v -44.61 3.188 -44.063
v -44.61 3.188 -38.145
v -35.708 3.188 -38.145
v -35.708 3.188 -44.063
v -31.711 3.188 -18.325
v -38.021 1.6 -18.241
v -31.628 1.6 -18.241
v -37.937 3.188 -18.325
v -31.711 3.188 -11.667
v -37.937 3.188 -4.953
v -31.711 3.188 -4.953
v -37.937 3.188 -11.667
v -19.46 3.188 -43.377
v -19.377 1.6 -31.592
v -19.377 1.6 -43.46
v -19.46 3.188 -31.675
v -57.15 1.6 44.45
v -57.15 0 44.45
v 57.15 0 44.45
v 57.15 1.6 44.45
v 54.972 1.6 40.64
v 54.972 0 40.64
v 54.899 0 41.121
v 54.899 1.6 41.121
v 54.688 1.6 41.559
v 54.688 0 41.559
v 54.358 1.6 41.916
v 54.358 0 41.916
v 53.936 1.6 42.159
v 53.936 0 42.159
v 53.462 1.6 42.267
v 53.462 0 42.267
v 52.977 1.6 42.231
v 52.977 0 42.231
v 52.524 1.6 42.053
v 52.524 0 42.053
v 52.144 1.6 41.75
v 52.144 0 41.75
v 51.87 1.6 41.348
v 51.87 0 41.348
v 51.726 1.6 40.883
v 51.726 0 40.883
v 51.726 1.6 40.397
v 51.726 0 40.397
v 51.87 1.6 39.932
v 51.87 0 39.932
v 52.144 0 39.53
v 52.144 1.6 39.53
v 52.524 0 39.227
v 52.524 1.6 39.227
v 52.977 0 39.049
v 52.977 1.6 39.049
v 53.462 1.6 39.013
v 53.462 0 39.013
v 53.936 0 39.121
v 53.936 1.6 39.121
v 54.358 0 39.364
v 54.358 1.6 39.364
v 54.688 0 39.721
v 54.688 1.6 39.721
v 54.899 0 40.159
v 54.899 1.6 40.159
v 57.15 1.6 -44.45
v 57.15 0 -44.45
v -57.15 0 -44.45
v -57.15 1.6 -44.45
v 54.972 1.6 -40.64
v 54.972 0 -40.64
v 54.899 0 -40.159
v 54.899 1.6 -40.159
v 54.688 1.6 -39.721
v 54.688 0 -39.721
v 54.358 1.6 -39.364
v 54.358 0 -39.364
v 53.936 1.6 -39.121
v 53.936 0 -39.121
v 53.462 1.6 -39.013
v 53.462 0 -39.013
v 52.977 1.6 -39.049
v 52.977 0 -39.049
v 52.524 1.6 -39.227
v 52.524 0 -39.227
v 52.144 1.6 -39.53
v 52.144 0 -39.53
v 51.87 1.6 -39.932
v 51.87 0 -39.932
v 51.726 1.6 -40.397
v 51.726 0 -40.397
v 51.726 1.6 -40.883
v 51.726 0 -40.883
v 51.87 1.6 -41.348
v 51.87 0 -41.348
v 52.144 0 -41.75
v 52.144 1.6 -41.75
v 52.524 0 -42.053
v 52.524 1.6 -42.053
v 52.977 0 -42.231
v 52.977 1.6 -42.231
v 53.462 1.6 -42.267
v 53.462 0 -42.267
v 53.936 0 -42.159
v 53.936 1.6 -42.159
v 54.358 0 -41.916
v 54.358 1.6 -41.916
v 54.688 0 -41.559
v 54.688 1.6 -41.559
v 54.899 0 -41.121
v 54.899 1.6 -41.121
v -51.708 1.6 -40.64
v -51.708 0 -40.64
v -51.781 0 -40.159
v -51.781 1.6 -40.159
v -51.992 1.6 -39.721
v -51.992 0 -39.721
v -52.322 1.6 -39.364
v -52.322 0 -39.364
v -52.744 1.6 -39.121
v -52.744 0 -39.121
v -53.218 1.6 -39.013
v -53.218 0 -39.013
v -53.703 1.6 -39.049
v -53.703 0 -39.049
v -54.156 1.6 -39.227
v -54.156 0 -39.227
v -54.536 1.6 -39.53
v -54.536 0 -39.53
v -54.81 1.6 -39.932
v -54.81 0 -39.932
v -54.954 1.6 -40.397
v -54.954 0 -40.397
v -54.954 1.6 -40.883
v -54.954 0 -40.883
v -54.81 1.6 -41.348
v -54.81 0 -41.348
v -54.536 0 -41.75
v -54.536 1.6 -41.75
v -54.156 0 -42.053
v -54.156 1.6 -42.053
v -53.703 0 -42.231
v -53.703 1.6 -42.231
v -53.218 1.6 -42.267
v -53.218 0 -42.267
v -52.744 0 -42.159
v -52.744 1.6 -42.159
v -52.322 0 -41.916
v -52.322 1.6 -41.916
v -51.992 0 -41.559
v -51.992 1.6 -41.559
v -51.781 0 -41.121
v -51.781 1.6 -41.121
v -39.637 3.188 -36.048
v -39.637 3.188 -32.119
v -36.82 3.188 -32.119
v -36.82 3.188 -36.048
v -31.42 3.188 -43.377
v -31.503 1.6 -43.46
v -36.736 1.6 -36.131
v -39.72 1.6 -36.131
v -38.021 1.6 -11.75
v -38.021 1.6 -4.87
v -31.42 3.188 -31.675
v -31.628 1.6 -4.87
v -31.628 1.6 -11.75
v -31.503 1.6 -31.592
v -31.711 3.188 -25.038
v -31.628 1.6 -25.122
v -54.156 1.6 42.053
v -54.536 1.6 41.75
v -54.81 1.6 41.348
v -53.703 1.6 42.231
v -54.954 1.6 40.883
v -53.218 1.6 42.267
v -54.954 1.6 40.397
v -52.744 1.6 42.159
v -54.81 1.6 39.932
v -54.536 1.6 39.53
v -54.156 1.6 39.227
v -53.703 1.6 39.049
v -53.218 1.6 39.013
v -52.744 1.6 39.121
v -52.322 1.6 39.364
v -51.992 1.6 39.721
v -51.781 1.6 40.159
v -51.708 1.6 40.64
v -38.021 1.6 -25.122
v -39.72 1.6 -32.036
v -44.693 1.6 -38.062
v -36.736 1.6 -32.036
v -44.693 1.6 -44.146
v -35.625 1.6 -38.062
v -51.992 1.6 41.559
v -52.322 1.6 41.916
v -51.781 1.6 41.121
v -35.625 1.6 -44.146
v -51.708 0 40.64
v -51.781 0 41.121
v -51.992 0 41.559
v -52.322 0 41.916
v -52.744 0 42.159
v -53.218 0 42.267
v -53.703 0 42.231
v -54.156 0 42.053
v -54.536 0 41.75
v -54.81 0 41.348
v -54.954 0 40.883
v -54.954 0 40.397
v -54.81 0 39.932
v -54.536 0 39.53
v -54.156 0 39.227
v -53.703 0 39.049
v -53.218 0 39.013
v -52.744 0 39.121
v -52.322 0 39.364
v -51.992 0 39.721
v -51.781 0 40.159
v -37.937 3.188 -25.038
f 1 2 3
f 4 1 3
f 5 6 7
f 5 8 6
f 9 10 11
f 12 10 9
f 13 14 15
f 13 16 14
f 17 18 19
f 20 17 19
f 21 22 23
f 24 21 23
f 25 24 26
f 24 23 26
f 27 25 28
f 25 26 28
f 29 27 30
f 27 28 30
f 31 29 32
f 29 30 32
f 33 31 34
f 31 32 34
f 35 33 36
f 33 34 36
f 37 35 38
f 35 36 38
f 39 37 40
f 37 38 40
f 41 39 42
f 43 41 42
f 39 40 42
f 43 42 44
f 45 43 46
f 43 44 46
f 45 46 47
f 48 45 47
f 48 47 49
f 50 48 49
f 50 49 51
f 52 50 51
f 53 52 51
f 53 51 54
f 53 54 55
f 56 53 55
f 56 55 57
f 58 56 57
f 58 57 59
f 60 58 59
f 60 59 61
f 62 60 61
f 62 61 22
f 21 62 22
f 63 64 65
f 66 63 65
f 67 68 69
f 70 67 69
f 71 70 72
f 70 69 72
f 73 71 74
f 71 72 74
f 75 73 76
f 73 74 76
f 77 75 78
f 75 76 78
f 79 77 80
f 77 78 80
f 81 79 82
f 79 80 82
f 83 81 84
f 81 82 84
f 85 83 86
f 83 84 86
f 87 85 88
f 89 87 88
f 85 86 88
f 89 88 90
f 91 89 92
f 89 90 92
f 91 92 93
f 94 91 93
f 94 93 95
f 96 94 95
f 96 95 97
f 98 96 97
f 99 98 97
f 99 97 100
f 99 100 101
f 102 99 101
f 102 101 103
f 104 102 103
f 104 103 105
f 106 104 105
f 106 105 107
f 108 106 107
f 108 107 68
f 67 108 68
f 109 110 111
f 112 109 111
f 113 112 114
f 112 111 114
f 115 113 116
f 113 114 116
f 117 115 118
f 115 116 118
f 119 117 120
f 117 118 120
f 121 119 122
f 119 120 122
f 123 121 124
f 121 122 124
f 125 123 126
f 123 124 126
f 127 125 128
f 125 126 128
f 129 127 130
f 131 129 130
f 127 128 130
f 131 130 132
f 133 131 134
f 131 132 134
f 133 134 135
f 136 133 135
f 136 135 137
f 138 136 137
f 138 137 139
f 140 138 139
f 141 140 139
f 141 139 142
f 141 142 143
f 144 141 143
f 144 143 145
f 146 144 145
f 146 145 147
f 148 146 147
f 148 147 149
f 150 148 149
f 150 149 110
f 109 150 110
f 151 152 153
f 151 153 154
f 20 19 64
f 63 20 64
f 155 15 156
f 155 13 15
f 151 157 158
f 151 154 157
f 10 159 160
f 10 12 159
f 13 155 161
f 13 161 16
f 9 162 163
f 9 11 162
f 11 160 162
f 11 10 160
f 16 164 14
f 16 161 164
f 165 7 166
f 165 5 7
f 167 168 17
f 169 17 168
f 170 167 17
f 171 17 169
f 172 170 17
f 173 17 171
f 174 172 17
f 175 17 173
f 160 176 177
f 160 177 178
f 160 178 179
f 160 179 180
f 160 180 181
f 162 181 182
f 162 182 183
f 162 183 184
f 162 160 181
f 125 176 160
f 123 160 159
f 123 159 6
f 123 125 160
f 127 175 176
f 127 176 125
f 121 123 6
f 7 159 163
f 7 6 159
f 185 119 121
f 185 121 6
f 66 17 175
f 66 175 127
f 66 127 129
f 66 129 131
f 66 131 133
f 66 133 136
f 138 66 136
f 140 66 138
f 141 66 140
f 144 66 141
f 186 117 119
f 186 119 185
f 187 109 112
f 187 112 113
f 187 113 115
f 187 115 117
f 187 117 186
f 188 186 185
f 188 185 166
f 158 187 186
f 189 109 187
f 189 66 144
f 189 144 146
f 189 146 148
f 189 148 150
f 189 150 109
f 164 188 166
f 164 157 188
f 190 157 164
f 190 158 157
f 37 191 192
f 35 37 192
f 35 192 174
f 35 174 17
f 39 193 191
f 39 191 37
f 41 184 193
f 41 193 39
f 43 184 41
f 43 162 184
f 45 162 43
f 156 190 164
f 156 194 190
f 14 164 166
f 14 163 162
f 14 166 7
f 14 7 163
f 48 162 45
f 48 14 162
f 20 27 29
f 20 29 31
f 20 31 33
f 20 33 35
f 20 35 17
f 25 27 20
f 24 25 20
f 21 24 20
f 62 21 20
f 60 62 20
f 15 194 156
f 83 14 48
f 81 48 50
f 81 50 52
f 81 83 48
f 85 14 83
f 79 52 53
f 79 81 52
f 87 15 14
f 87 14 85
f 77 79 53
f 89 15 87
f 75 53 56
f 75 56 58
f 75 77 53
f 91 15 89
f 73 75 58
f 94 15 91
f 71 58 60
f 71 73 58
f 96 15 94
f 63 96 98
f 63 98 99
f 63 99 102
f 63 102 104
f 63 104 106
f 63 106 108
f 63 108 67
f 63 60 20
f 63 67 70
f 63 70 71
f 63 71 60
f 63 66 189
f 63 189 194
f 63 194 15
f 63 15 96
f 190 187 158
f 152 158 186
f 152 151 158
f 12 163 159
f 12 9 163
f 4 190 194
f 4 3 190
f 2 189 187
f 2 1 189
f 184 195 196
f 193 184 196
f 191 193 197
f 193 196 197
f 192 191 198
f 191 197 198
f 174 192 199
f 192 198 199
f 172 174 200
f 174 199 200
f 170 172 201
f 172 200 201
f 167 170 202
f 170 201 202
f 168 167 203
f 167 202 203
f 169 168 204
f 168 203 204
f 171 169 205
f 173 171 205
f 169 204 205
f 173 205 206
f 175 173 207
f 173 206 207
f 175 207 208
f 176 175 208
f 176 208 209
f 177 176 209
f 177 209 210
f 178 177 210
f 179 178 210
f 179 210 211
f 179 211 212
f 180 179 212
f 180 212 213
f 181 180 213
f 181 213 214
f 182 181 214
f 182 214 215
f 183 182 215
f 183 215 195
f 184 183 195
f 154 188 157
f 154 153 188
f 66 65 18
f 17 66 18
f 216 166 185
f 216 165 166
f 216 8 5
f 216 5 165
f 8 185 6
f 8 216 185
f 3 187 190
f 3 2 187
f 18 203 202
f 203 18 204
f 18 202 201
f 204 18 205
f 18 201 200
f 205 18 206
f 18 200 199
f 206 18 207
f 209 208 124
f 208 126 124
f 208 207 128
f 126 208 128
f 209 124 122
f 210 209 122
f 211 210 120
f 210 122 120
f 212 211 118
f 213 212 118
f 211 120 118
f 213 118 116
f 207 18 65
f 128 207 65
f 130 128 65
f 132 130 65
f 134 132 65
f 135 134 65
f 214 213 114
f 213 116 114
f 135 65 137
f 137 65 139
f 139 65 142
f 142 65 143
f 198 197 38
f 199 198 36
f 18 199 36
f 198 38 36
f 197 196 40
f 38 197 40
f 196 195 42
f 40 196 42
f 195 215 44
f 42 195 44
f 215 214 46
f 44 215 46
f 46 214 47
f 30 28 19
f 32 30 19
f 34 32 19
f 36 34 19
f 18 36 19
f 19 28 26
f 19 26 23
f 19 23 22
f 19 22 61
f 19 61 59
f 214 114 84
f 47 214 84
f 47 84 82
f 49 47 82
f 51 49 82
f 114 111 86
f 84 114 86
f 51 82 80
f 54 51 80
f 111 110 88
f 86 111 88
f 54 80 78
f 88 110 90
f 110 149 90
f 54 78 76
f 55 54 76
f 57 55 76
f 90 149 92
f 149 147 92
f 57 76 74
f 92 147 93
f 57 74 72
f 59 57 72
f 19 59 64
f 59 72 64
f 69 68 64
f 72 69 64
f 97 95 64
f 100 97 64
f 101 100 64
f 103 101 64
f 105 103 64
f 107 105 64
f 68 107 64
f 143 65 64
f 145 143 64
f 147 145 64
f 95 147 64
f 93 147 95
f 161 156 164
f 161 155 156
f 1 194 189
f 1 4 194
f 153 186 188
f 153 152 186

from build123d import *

# Parameters (mm, degrees)
EXTRUDE1_DEPTH        = 1.6002
F_4_CLEARANCE_HOLE1_D = 3.2639
SKETCH5_W             = 6.392759032
SKETCH5_H             = 6.880194124
SKETCH5_W_2           = 9.067841131
SKETCH5_H_2           = 6.084228887
SKETCH5_H_3           = 6.880194125
SKETCH5_W_3           = 12.126342144
SKETCH5_H_4           = 11.868334865
SKETCH5_W_4           = 2.983612243
SKETCH5_H_5           = 4.095154059
BOSS_EXTRUDE1_DEPTH   = 1.5875
BOSS_EXTRUDE1_TAPER   = 3


with BuildPart() as part:
    # Sketch1 → Extrude1 (new body)
    with BuildSketch(Plane(origin=(0, 0, 0), x_dir=(1, 0, 0), z_dir=(0, 1, 0))):
        Polygon((-55.88, -44.45), (49.53, -44.45), (57.15, -44.45), (57.15, -6.35), (57.15, 44.45), (-57.15, 44.45), (-57.15, -6.35), (-57.15, -44.45), align=None)
    extrude(amount=EXTRUDE1_DEPTH)

    # #4 Clearance Hole1 (through all)
    with Locations(Plane(origin=(0, 1.6002, 0), x_dir=(-1, 0, 0), z_dir=(0, 1, 0))):
        with Locations((53.34, -40.64), (-53.34, -40.64), (-53.34, 40.64), (53.34, 40.64)):
            Hole(F_4_CLEARANCE_HOLE1_D / 2)

    # Sketch5 → Boss-Extrude1 (add)
    with BuildSketch(Plane(origin=(0, 1.6002, 0), x_dir=(1, 0, 0), z_dir=(0, 1, 0))):
        with Locations((-34.824290025, 21.681433757)):
            Rectangle(SKETCH5_W, SKETCH5_H)
        with Locations((-40.158796151, 41.104015903)):
            Rectangle(SKETCH5_W_2, SKETCH5_H_2)
        with Locations((-34.824290025, 8.310130462)):
            Rectangle(SKETCH5_W, SKETCH5_H_3)
        with Locations((-25.440323861, 37.525712701)):
            Rectangle(SKETCH5_W_3, SKETCH5_H_4)
        with Locations((-38.228223524, 34.083751803)):
            Rectangle(SKETCH5_W_4, SKETCH5_H_5)
    extrude(amount=BOSS_EXTRUDE1_DEPTH, taper=BOSS_EXTRUDE1_TAPER)


solid = part.part
